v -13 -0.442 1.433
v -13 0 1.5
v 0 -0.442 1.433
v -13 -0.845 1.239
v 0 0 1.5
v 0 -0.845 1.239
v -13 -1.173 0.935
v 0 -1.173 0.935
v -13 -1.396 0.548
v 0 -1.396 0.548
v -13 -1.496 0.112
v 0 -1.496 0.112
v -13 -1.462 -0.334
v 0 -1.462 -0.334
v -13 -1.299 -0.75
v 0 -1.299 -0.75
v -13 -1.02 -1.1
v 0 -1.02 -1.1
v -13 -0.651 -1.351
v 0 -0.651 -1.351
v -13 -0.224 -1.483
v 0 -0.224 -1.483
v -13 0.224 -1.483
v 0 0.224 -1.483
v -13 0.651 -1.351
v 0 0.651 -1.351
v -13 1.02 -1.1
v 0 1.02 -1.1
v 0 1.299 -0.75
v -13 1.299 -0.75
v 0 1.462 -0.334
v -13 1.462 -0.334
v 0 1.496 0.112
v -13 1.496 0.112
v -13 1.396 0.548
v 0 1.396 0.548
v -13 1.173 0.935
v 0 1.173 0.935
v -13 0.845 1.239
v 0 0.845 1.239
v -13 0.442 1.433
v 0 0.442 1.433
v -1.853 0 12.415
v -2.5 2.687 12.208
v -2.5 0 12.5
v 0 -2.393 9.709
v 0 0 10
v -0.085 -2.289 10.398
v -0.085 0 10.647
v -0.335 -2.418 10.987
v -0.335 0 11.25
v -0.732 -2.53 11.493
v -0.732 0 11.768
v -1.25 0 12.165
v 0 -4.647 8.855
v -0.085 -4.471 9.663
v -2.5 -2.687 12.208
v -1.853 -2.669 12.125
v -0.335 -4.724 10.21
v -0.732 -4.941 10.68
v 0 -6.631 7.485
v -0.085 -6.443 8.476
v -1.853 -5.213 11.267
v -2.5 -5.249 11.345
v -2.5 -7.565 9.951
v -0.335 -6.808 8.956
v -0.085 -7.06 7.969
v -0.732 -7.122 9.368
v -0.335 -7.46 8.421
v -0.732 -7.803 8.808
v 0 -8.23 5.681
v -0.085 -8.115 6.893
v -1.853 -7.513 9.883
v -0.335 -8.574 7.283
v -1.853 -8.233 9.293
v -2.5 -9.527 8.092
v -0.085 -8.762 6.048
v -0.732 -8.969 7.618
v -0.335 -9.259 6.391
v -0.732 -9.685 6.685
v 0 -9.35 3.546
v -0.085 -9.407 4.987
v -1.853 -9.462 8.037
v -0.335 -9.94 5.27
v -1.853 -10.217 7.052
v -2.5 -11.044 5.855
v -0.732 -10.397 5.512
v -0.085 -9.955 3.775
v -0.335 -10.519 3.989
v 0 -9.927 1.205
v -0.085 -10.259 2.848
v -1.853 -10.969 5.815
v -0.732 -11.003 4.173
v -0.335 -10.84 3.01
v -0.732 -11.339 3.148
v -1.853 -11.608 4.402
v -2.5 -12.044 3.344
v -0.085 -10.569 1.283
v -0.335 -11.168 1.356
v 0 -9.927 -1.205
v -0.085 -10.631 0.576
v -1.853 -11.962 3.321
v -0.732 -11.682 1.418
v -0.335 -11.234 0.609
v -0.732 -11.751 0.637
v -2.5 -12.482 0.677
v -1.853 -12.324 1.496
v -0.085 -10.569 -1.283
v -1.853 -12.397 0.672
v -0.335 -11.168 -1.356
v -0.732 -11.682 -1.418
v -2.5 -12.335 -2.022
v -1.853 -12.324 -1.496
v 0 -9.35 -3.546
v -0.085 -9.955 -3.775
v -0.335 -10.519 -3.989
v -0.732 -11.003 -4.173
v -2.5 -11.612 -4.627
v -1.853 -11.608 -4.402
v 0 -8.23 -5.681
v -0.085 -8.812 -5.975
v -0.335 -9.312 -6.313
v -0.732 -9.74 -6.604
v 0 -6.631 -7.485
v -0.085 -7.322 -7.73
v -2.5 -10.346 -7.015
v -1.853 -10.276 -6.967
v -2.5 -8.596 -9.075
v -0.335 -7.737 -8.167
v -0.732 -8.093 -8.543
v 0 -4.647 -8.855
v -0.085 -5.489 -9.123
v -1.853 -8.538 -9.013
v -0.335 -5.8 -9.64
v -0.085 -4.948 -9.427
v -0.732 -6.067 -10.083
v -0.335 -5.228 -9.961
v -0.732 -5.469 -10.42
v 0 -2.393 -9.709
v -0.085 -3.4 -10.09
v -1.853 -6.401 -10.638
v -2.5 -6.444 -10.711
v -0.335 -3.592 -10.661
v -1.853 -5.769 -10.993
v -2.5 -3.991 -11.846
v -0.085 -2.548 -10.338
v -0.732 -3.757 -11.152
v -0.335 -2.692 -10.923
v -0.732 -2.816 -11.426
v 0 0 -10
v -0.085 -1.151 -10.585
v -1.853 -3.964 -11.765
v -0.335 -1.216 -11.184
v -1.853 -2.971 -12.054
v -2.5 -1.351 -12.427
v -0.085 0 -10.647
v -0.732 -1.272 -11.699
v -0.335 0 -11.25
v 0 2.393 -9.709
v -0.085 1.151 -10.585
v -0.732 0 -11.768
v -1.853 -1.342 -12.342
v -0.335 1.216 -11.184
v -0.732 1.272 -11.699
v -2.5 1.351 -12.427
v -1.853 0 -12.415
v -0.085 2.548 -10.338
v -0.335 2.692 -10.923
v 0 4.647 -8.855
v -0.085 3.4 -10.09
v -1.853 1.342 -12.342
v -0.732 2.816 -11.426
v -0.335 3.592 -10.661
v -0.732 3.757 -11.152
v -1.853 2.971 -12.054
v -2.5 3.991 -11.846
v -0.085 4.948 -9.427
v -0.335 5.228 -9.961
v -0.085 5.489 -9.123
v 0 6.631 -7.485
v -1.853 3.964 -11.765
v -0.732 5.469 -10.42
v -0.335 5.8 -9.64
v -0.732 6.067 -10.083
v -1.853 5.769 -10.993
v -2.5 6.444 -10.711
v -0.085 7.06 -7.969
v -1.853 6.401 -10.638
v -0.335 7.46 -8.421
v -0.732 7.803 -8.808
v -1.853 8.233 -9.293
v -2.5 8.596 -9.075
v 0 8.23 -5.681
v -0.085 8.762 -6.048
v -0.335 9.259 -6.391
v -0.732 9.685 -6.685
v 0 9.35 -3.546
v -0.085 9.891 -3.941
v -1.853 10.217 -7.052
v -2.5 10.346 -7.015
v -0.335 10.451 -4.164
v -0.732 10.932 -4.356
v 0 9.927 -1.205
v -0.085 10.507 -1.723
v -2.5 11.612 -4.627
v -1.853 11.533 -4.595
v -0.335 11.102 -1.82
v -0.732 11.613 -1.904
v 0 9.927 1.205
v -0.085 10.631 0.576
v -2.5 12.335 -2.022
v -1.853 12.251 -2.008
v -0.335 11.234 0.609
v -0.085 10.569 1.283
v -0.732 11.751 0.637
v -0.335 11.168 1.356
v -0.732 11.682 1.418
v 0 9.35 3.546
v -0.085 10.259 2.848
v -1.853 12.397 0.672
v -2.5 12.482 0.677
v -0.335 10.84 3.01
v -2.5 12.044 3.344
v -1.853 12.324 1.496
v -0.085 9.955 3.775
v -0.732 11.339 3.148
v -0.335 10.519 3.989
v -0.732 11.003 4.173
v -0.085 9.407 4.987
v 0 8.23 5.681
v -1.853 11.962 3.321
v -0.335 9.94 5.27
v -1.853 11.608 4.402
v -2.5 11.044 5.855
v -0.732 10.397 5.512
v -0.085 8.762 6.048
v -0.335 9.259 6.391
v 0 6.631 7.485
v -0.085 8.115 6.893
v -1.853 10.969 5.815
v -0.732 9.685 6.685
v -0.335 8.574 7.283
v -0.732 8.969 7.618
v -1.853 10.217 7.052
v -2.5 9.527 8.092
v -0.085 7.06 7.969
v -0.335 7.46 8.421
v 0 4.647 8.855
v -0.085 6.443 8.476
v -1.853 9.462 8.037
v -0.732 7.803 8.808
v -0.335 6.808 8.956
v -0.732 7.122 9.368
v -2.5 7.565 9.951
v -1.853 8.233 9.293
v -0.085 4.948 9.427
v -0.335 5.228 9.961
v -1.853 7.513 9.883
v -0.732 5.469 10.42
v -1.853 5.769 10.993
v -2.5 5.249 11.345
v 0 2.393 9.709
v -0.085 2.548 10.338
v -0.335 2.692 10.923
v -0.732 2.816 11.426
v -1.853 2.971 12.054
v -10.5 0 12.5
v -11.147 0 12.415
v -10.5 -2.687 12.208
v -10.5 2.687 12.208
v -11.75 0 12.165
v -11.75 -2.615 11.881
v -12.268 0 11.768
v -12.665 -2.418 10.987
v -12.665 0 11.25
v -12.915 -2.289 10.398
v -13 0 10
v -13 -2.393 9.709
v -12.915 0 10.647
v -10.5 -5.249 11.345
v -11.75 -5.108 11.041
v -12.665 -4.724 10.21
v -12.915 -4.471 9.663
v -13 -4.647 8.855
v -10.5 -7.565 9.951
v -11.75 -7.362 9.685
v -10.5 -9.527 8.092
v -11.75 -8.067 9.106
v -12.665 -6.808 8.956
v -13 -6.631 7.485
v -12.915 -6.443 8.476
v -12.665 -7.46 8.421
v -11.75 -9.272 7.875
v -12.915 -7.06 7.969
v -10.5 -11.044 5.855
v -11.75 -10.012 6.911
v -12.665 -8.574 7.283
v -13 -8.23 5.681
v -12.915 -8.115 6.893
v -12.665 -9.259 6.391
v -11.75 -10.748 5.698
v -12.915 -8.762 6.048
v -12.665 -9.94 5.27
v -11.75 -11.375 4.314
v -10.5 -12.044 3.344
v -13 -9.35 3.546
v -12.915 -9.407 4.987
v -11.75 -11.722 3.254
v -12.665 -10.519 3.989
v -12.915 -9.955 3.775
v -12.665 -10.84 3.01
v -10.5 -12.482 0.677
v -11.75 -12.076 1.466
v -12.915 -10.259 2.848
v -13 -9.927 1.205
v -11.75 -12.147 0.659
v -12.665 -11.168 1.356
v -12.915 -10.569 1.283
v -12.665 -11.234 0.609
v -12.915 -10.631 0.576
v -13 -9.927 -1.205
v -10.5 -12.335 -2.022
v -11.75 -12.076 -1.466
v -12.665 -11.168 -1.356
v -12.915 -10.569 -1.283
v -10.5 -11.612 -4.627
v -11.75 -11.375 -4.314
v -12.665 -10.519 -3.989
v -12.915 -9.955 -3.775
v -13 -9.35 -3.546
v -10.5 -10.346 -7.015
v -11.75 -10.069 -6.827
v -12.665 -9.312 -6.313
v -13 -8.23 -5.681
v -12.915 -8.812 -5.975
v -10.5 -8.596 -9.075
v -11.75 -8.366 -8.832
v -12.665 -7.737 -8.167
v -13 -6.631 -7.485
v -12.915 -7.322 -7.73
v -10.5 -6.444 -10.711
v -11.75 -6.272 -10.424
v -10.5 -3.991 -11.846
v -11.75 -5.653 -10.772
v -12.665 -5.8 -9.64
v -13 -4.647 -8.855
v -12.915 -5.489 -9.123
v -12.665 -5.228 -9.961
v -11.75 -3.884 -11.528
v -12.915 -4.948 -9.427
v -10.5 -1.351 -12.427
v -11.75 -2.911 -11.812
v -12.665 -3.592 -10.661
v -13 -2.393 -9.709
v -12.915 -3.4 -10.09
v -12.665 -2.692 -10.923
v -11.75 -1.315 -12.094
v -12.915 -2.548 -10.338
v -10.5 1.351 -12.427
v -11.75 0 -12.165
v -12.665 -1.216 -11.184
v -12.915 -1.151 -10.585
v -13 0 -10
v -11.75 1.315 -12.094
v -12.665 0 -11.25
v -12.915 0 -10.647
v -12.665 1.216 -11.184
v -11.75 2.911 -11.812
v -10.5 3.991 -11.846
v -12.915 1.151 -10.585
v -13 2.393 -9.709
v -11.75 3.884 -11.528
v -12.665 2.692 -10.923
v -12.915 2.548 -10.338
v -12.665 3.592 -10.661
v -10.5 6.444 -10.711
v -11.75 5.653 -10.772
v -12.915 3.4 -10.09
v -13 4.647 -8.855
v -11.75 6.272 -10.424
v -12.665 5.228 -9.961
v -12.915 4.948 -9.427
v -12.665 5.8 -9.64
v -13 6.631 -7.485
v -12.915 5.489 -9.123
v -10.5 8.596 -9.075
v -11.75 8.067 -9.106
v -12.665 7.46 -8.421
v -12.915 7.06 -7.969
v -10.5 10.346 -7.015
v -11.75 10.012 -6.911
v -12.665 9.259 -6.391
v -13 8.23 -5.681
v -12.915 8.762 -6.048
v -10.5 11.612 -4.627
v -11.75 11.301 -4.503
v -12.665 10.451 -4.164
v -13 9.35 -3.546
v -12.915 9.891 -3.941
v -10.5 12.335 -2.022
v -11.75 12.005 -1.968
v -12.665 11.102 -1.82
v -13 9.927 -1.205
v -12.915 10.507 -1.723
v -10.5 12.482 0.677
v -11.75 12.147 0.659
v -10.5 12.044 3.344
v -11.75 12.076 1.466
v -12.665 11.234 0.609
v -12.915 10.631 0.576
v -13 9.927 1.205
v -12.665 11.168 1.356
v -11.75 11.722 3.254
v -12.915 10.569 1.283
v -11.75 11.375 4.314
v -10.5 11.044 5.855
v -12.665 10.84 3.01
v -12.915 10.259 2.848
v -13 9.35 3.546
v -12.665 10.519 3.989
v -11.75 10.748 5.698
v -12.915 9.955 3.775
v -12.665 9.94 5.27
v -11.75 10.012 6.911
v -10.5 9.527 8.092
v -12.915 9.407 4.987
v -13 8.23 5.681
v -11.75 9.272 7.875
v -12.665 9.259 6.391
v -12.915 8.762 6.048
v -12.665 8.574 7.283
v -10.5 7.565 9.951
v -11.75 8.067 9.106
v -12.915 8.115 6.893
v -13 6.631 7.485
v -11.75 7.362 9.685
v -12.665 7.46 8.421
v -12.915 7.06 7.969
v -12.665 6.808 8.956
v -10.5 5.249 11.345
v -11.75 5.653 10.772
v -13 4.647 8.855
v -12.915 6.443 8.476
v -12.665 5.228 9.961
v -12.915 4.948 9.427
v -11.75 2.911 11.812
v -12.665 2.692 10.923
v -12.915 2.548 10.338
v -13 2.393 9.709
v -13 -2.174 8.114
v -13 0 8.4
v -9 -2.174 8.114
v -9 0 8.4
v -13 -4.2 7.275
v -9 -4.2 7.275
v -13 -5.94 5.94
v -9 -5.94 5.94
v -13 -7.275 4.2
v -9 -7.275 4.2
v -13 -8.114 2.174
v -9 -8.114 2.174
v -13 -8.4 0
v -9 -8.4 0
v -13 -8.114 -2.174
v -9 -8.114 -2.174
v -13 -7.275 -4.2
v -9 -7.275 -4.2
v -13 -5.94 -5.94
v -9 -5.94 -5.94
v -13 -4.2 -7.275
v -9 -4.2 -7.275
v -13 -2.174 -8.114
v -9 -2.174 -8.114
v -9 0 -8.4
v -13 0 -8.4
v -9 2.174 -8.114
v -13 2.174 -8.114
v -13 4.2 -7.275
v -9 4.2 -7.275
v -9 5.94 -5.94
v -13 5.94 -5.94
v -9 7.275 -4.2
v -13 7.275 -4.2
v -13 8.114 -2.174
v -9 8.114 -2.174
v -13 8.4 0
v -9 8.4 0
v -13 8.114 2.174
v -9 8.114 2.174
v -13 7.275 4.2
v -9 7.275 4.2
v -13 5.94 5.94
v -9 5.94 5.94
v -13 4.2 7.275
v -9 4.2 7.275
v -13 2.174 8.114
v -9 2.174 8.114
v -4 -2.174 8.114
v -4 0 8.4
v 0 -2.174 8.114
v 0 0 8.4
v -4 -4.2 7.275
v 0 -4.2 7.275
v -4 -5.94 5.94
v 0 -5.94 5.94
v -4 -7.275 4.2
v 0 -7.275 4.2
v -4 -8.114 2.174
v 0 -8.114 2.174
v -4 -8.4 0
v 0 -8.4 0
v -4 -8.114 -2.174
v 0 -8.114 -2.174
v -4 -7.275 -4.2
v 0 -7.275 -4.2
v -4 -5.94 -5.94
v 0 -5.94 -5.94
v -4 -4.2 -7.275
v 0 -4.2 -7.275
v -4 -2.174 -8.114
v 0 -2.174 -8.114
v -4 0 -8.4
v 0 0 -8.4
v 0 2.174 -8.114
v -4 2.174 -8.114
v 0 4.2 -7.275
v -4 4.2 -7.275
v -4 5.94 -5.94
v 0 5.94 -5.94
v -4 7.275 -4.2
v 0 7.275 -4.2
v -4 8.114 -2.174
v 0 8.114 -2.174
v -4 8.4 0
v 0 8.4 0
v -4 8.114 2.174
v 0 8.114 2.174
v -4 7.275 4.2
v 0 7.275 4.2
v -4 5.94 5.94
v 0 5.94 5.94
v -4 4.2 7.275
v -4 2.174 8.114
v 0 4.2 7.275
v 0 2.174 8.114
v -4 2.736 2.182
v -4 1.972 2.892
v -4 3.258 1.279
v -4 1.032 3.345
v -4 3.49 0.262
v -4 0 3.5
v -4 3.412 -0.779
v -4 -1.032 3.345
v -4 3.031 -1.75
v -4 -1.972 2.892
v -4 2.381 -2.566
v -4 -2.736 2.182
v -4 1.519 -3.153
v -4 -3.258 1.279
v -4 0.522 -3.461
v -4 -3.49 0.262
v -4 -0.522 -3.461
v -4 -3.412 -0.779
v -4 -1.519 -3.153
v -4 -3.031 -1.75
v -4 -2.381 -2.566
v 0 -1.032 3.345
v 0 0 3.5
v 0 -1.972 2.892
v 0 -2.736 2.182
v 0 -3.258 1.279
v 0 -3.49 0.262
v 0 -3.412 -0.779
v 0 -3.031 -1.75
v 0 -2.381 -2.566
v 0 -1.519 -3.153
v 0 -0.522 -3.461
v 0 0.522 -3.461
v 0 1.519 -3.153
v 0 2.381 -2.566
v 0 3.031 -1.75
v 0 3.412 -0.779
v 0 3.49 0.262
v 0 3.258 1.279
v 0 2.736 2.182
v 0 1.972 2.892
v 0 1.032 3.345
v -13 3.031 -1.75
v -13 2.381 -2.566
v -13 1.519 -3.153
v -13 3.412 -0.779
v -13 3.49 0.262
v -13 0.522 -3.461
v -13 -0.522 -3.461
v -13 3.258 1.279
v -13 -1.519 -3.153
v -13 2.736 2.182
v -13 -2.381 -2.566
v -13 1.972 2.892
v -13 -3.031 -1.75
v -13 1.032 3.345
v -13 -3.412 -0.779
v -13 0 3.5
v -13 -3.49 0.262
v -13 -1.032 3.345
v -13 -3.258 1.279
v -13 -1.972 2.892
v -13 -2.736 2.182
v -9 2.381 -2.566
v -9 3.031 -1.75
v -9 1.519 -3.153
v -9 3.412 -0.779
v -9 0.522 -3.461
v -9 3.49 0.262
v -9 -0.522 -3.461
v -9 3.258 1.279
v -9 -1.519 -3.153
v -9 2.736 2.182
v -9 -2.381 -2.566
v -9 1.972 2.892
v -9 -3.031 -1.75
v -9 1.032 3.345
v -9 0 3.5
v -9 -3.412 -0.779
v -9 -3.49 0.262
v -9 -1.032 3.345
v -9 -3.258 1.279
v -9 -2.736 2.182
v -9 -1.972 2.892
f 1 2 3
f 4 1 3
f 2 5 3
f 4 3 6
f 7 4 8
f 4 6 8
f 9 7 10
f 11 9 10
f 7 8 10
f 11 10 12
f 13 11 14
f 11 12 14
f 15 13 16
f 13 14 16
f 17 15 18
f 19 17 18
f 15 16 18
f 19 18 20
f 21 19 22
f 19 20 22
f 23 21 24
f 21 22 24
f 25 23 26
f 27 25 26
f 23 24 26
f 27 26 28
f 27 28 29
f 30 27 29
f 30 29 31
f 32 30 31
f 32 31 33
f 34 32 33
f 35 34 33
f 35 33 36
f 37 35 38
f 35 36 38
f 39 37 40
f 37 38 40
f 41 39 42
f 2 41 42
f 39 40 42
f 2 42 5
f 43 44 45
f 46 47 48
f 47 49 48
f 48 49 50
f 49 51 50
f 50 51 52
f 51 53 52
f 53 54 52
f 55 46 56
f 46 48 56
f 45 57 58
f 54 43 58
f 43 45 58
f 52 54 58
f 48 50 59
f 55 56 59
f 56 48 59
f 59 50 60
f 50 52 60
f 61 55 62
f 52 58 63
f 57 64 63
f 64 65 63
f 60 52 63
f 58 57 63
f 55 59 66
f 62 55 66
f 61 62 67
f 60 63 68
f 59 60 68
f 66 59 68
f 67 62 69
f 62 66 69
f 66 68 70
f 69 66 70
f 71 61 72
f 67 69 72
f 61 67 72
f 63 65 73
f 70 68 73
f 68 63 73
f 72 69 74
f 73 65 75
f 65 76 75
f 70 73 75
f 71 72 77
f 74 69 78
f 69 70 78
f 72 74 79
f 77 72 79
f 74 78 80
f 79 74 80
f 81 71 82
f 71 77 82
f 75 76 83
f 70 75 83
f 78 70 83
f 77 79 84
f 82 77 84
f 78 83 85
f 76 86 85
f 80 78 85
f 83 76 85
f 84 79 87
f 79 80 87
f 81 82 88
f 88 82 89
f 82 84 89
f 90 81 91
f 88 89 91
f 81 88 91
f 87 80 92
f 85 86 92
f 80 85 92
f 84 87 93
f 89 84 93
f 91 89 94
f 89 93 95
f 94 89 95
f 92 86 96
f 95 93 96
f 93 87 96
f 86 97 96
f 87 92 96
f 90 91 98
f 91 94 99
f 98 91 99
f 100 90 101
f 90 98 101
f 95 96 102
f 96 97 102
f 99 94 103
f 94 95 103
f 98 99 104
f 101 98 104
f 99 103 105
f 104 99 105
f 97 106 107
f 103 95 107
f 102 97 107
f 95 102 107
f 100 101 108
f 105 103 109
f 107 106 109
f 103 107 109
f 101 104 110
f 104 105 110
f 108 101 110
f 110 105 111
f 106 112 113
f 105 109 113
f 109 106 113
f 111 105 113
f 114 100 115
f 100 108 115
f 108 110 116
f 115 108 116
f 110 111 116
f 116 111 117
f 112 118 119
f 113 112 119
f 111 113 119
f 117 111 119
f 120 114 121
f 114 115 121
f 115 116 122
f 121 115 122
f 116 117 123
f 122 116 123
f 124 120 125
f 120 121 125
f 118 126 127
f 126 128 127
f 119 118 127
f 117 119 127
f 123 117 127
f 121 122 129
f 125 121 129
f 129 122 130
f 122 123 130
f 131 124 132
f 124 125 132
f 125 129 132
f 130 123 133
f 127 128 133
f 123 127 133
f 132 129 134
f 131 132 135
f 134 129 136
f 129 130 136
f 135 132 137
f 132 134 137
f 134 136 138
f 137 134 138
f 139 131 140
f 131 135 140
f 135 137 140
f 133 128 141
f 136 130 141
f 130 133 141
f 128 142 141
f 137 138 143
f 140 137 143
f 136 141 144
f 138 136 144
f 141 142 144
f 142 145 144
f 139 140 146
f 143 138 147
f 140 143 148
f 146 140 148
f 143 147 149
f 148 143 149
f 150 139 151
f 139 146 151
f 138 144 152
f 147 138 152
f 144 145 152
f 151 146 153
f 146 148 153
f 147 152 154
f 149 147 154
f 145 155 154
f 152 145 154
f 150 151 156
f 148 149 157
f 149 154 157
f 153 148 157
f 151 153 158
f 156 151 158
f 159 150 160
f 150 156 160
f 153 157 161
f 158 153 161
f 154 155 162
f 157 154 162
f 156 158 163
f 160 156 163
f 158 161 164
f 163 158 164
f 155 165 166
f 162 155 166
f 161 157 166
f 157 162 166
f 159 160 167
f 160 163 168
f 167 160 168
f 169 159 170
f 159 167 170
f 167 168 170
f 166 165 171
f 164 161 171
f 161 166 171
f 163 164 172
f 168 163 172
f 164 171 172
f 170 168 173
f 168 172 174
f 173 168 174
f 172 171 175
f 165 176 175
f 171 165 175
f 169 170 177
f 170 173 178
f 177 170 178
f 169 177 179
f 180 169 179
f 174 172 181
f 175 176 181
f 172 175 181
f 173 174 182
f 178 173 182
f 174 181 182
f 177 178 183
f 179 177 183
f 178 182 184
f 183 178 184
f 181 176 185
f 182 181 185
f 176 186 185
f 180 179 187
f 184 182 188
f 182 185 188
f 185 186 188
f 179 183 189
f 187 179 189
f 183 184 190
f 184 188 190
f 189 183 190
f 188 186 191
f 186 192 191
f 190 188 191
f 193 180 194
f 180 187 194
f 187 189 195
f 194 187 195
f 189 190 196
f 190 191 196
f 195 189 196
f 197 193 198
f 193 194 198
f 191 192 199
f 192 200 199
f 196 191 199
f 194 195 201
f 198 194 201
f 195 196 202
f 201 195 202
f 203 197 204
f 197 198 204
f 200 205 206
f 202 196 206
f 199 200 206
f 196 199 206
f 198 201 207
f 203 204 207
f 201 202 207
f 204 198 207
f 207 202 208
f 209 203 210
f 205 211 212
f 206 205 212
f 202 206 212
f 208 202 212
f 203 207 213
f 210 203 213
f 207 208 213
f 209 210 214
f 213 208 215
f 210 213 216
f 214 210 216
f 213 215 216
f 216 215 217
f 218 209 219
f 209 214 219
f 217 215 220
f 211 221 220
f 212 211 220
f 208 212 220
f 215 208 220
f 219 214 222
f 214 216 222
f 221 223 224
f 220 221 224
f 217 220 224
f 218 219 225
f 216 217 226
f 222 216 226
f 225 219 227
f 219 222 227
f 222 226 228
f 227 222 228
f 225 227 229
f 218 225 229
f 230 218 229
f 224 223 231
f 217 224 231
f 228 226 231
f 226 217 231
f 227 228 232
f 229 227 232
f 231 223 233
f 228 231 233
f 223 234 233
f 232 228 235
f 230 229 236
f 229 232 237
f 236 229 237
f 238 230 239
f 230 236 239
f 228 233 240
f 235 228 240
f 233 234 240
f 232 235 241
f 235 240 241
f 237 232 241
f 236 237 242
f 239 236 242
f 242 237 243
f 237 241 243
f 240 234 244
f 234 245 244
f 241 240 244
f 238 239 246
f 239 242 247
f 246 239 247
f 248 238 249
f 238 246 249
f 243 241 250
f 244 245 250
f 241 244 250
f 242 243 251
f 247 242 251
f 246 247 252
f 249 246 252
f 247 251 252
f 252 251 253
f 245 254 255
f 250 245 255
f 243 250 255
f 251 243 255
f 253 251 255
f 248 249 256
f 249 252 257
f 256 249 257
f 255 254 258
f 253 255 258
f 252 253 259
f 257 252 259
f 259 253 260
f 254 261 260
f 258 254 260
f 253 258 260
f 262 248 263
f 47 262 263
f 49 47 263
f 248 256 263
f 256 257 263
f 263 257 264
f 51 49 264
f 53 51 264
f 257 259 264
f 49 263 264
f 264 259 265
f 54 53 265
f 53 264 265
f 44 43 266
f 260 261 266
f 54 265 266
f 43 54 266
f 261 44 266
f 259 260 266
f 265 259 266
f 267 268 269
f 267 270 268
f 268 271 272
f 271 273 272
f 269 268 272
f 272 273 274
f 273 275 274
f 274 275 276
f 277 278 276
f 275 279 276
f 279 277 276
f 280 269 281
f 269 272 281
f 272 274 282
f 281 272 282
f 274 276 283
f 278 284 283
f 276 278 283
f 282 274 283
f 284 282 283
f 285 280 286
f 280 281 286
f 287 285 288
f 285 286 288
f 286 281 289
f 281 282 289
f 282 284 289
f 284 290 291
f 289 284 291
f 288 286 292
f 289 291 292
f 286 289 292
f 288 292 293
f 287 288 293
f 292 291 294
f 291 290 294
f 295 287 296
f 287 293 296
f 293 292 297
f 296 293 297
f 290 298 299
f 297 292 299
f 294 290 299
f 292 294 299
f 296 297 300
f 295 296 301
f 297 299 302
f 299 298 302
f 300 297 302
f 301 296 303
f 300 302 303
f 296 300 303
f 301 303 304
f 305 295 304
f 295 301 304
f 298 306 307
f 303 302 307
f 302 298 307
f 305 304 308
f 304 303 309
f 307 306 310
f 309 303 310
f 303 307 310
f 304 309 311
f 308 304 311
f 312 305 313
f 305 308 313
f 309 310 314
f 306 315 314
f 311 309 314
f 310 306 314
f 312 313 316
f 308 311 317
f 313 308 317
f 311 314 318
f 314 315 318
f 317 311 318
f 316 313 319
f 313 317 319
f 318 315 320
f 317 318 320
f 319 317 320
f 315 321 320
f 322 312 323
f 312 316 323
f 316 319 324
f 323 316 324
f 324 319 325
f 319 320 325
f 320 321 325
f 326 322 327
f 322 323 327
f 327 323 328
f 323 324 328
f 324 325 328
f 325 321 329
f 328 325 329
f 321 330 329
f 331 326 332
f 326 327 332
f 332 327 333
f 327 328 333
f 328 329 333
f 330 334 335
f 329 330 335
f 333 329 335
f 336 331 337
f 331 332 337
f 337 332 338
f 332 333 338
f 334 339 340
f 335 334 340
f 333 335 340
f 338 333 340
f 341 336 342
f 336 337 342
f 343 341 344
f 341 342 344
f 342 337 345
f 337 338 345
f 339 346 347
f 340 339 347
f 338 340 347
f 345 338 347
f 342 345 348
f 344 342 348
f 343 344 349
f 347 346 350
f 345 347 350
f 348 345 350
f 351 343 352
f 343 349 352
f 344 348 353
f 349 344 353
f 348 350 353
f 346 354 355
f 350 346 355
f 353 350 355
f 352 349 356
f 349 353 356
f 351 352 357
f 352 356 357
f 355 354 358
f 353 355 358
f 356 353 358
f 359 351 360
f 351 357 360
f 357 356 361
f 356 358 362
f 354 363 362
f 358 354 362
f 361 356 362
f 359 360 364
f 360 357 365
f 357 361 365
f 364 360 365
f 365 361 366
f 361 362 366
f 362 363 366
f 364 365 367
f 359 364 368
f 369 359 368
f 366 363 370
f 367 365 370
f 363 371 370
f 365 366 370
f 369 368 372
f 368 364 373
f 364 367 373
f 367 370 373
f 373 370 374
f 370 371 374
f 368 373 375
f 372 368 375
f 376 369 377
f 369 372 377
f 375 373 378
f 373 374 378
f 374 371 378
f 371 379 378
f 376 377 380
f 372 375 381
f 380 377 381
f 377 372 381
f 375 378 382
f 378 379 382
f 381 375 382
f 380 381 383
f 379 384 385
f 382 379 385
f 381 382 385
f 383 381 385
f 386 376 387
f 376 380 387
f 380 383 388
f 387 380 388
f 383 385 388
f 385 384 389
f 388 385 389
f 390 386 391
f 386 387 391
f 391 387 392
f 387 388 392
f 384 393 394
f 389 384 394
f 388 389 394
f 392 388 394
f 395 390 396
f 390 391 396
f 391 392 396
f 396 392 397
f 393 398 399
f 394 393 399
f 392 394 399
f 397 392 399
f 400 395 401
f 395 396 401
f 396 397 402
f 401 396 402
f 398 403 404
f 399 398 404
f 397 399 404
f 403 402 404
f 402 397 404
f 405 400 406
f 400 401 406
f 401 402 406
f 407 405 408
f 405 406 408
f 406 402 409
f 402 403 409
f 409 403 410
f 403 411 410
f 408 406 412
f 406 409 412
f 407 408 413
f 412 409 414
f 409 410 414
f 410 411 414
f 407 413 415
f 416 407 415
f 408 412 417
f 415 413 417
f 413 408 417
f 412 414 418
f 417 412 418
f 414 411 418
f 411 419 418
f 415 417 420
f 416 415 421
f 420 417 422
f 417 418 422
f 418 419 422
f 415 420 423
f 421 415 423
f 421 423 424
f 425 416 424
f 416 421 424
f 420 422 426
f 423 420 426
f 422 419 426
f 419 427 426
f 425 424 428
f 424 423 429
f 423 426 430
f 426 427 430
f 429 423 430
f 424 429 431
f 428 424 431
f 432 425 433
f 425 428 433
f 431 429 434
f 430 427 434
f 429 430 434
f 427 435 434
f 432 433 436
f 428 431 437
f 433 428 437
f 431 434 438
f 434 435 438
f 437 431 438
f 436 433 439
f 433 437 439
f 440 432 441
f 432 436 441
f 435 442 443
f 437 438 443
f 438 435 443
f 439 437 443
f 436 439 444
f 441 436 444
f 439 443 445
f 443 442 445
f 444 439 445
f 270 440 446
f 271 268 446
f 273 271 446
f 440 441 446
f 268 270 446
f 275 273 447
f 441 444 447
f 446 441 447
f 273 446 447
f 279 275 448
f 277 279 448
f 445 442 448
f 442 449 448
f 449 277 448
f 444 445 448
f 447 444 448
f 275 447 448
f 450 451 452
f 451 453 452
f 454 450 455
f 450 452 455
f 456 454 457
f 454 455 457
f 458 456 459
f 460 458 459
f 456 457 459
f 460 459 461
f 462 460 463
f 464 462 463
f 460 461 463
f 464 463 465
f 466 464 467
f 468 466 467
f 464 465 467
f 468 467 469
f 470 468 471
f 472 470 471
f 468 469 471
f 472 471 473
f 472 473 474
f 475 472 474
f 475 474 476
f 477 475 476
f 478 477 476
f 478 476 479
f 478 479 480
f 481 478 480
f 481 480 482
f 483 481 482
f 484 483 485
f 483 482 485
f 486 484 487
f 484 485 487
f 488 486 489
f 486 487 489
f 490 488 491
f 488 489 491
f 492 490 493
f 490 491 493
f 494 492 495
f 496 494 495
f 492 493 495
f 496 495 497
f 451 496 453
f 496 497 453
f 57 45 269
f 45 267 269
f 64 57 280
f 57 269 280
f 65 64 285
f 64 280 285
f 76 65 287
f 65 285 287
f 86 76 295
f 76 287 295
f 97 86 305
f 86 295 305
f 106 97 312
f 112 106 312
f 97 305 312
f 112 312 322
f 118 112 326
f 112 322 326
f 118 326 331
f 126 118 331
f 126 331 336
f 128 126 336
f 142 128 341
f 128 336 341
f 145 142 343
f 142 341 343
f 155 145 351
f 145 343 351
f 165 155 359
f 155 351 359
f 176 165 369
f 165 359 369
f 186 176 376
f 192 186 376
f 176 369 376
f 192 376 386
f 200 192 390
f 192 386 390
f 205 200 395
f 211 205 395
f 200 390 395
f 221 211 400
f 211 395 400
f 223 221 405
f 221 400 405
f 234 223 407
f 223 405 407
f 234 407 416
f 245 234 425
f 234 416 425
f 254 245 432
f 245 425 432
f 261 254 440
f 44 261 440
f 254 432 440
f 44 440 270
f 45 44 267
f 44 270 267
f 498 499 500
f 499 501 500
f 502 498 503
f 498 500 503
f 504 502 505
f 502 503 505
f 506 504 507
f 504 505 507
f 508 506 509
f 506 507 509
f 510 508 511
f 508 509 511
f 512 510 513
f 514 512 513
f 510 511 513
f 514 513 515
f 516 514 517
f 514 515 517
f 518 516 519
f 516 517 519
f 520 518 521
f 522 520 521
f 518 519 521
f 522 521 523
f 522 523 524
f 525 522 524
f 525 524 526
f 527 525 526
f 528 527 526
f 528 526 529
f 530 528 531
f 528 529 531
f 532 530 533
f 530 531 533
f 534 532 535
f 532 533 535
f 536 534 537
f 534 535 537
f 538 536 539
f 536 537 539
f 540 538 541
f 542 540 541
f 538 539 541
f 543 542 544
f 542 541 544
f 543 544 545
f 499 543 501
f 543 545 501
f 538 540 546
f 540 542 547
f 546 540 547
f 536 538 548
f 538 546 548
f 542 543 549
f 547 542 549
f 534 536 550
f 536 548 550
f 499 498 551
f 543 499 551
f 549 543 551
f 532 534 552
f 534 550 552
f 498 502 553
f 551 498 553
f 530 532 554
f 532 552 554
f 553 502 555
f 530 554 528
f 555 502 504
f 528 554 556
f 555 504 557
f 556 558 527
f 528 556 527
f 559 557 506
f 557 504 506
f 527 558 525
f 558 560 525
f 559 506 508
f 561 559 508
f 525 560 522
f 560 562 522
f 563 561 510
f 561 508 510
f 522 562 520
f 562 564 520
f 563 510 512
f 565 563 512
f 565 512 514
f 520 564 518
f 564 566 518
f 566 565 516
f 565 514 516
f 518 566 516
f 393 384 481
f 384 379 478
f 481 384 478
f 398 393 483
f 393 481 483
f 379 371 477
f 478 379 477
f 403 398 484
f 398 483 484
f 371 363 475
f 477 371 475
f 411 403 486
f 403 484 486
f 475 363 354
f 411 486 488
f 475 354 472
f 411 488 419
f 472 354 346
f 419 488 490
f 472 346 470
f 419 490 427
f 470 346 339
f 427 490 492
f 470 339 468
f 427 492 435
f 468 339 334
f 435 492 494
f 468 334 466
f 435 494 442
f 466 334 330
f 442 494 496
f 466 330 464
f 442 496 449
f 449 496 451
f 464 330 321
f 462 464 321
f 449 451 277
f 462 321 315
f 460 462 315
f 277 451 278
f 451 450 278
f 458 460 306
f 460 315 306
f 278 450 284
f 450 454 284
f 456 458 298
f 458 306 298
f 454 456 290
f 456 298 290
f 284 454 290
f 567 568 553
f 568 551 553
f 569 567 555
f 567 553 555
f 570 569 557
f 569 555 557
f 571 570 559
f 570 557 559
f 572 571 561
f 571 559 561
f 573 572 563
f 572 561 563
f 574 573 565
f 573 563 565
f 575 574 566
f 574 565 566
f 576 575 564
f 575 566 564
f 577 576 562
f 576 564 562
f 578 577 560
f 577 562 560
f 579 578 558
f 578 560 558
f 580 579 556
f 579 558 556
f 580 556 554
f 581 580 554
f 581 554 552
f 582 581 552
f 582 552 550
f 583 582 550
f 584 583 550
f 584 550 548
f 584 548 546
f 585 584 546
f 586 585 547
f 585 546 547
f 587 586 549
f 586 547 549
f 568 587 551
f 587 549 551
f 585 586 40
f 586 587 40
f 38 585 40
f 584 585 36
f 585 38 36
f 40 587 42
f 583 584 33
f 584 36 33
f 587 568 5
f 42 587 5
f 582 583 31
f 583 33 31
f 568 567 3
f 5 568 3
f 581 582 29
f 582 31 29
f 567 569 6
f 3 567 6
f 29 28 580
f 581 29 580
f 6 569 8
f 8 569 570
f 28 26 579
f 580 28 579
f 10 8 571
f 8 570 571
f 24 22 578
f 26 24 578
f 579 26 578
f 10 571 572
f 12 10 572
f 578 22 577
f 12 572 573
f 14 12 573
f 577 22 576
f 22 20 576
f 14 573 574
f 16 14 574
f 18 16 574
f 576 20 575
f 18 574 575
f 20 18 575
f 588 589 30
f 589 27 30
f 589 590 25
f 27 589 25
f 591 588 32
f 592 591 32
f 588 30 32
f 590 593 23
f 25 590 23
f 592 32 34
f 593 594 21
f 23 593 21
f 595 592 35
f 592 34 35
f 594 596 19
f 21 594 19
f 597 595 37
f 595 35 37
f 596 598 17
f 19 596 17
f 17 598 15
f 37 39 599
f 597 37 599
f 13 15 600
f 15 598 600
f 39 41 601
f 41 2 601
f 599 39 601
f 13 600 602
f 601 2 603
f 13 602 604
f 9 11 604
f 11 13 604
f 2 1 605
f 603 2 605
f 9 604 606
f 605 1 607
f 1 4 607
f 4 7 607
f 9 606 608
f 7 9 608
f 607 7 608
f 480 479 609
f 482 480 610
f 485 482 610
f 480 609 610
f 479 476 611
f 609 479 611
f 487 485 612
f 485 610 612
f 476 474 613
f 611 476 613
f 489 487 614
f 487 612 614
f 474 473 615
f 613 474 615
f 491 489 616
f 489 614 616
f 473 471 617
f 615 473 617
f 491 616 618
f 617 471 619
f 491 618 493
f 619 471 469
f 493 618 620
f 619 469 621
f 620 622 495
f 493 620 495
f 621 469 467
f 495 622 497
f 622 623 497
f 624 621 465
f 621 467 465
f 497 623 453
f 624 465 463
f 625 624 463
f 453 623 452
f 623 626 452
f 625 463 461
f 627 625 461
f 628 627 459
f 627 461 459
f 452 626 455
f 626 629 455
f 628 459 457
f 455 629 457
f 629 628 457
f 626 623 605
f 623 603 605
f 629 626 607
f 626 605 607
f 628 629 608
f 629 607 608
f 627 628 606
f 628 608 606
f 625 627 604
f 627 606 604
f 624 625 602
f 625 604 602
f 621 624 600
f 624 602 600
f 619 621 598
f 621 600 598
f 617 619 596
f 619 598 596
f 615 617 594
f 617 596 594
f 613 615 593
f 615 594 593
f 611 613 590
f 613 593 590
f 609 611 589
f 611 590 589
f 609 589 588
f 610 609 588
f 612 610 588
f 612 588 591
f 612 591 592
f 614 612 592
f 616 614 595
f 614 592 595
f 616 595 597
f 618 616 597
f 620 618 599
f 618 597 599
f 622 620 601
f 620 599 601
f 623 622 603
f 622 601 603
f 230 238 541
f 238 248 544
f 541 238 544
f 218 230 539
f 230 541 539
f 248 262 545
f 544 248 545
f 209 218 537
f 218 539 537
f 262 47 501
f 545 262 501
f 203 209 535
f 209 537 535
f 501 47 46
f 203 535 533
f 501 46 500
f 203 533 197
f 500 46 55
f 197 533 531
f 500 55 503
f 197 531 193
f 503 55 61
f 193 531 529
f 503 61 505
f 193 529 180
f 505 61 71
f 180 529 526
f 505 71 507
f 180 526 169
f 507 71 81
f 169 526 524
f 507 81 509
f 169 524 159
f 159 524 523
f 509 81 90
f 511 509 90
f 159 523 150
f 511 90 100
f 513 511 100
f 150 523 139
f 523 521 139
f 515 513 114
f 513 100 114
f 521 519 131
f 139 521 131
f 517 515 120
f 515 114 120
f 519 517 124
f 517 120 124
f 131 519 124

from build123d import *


with BuildPart() as part:
    # Sketch1 → Revolve1 (revolve)
    with BuildSketch(Plane.XY, mode=Mode.PRIVATE) as revolve1_sk:
        with BuildLine():
            Line((0, 1.5), (0, 3.5))
            Line((0, 3.5), (-4, 3.5))
            Line((-4, 3.5), (-4, 8.4))
            Line((-4, 8.4), (0, 8.4))
            Line((0, 8.4), (0, 10))
            ThreePointArc((0, 10), (-0.732233047, 11.767766953), (-2.5, 12.5))
            Line((-2.5, 12.5), (-10.5, 12.5))
            ThreePointArc((-10.5, 12.5), (-12.267766953, 11.767766953), (-13, 10))
            Line((-13, 10), (-13, 8.4))
            Line((-13, 8.4), (-9, 8.4))
            Line((-9, 8.4), (-9, 3.5))
            Line((-9, 3.5), (-13, 3.5))
            Line((-13, 3.5), (-13, 1.5))
            Line((-13, 1.5), (0, 1.5))
        make_face()
    revolve(revolve1_sk.sketch.rotate(Axis((-1000.574907176, 0, 0), (1, 0, 0)), 90), axis=Axis((-1000.574907176, 0, 0), (1, 0, 0)))


solid = part.part
